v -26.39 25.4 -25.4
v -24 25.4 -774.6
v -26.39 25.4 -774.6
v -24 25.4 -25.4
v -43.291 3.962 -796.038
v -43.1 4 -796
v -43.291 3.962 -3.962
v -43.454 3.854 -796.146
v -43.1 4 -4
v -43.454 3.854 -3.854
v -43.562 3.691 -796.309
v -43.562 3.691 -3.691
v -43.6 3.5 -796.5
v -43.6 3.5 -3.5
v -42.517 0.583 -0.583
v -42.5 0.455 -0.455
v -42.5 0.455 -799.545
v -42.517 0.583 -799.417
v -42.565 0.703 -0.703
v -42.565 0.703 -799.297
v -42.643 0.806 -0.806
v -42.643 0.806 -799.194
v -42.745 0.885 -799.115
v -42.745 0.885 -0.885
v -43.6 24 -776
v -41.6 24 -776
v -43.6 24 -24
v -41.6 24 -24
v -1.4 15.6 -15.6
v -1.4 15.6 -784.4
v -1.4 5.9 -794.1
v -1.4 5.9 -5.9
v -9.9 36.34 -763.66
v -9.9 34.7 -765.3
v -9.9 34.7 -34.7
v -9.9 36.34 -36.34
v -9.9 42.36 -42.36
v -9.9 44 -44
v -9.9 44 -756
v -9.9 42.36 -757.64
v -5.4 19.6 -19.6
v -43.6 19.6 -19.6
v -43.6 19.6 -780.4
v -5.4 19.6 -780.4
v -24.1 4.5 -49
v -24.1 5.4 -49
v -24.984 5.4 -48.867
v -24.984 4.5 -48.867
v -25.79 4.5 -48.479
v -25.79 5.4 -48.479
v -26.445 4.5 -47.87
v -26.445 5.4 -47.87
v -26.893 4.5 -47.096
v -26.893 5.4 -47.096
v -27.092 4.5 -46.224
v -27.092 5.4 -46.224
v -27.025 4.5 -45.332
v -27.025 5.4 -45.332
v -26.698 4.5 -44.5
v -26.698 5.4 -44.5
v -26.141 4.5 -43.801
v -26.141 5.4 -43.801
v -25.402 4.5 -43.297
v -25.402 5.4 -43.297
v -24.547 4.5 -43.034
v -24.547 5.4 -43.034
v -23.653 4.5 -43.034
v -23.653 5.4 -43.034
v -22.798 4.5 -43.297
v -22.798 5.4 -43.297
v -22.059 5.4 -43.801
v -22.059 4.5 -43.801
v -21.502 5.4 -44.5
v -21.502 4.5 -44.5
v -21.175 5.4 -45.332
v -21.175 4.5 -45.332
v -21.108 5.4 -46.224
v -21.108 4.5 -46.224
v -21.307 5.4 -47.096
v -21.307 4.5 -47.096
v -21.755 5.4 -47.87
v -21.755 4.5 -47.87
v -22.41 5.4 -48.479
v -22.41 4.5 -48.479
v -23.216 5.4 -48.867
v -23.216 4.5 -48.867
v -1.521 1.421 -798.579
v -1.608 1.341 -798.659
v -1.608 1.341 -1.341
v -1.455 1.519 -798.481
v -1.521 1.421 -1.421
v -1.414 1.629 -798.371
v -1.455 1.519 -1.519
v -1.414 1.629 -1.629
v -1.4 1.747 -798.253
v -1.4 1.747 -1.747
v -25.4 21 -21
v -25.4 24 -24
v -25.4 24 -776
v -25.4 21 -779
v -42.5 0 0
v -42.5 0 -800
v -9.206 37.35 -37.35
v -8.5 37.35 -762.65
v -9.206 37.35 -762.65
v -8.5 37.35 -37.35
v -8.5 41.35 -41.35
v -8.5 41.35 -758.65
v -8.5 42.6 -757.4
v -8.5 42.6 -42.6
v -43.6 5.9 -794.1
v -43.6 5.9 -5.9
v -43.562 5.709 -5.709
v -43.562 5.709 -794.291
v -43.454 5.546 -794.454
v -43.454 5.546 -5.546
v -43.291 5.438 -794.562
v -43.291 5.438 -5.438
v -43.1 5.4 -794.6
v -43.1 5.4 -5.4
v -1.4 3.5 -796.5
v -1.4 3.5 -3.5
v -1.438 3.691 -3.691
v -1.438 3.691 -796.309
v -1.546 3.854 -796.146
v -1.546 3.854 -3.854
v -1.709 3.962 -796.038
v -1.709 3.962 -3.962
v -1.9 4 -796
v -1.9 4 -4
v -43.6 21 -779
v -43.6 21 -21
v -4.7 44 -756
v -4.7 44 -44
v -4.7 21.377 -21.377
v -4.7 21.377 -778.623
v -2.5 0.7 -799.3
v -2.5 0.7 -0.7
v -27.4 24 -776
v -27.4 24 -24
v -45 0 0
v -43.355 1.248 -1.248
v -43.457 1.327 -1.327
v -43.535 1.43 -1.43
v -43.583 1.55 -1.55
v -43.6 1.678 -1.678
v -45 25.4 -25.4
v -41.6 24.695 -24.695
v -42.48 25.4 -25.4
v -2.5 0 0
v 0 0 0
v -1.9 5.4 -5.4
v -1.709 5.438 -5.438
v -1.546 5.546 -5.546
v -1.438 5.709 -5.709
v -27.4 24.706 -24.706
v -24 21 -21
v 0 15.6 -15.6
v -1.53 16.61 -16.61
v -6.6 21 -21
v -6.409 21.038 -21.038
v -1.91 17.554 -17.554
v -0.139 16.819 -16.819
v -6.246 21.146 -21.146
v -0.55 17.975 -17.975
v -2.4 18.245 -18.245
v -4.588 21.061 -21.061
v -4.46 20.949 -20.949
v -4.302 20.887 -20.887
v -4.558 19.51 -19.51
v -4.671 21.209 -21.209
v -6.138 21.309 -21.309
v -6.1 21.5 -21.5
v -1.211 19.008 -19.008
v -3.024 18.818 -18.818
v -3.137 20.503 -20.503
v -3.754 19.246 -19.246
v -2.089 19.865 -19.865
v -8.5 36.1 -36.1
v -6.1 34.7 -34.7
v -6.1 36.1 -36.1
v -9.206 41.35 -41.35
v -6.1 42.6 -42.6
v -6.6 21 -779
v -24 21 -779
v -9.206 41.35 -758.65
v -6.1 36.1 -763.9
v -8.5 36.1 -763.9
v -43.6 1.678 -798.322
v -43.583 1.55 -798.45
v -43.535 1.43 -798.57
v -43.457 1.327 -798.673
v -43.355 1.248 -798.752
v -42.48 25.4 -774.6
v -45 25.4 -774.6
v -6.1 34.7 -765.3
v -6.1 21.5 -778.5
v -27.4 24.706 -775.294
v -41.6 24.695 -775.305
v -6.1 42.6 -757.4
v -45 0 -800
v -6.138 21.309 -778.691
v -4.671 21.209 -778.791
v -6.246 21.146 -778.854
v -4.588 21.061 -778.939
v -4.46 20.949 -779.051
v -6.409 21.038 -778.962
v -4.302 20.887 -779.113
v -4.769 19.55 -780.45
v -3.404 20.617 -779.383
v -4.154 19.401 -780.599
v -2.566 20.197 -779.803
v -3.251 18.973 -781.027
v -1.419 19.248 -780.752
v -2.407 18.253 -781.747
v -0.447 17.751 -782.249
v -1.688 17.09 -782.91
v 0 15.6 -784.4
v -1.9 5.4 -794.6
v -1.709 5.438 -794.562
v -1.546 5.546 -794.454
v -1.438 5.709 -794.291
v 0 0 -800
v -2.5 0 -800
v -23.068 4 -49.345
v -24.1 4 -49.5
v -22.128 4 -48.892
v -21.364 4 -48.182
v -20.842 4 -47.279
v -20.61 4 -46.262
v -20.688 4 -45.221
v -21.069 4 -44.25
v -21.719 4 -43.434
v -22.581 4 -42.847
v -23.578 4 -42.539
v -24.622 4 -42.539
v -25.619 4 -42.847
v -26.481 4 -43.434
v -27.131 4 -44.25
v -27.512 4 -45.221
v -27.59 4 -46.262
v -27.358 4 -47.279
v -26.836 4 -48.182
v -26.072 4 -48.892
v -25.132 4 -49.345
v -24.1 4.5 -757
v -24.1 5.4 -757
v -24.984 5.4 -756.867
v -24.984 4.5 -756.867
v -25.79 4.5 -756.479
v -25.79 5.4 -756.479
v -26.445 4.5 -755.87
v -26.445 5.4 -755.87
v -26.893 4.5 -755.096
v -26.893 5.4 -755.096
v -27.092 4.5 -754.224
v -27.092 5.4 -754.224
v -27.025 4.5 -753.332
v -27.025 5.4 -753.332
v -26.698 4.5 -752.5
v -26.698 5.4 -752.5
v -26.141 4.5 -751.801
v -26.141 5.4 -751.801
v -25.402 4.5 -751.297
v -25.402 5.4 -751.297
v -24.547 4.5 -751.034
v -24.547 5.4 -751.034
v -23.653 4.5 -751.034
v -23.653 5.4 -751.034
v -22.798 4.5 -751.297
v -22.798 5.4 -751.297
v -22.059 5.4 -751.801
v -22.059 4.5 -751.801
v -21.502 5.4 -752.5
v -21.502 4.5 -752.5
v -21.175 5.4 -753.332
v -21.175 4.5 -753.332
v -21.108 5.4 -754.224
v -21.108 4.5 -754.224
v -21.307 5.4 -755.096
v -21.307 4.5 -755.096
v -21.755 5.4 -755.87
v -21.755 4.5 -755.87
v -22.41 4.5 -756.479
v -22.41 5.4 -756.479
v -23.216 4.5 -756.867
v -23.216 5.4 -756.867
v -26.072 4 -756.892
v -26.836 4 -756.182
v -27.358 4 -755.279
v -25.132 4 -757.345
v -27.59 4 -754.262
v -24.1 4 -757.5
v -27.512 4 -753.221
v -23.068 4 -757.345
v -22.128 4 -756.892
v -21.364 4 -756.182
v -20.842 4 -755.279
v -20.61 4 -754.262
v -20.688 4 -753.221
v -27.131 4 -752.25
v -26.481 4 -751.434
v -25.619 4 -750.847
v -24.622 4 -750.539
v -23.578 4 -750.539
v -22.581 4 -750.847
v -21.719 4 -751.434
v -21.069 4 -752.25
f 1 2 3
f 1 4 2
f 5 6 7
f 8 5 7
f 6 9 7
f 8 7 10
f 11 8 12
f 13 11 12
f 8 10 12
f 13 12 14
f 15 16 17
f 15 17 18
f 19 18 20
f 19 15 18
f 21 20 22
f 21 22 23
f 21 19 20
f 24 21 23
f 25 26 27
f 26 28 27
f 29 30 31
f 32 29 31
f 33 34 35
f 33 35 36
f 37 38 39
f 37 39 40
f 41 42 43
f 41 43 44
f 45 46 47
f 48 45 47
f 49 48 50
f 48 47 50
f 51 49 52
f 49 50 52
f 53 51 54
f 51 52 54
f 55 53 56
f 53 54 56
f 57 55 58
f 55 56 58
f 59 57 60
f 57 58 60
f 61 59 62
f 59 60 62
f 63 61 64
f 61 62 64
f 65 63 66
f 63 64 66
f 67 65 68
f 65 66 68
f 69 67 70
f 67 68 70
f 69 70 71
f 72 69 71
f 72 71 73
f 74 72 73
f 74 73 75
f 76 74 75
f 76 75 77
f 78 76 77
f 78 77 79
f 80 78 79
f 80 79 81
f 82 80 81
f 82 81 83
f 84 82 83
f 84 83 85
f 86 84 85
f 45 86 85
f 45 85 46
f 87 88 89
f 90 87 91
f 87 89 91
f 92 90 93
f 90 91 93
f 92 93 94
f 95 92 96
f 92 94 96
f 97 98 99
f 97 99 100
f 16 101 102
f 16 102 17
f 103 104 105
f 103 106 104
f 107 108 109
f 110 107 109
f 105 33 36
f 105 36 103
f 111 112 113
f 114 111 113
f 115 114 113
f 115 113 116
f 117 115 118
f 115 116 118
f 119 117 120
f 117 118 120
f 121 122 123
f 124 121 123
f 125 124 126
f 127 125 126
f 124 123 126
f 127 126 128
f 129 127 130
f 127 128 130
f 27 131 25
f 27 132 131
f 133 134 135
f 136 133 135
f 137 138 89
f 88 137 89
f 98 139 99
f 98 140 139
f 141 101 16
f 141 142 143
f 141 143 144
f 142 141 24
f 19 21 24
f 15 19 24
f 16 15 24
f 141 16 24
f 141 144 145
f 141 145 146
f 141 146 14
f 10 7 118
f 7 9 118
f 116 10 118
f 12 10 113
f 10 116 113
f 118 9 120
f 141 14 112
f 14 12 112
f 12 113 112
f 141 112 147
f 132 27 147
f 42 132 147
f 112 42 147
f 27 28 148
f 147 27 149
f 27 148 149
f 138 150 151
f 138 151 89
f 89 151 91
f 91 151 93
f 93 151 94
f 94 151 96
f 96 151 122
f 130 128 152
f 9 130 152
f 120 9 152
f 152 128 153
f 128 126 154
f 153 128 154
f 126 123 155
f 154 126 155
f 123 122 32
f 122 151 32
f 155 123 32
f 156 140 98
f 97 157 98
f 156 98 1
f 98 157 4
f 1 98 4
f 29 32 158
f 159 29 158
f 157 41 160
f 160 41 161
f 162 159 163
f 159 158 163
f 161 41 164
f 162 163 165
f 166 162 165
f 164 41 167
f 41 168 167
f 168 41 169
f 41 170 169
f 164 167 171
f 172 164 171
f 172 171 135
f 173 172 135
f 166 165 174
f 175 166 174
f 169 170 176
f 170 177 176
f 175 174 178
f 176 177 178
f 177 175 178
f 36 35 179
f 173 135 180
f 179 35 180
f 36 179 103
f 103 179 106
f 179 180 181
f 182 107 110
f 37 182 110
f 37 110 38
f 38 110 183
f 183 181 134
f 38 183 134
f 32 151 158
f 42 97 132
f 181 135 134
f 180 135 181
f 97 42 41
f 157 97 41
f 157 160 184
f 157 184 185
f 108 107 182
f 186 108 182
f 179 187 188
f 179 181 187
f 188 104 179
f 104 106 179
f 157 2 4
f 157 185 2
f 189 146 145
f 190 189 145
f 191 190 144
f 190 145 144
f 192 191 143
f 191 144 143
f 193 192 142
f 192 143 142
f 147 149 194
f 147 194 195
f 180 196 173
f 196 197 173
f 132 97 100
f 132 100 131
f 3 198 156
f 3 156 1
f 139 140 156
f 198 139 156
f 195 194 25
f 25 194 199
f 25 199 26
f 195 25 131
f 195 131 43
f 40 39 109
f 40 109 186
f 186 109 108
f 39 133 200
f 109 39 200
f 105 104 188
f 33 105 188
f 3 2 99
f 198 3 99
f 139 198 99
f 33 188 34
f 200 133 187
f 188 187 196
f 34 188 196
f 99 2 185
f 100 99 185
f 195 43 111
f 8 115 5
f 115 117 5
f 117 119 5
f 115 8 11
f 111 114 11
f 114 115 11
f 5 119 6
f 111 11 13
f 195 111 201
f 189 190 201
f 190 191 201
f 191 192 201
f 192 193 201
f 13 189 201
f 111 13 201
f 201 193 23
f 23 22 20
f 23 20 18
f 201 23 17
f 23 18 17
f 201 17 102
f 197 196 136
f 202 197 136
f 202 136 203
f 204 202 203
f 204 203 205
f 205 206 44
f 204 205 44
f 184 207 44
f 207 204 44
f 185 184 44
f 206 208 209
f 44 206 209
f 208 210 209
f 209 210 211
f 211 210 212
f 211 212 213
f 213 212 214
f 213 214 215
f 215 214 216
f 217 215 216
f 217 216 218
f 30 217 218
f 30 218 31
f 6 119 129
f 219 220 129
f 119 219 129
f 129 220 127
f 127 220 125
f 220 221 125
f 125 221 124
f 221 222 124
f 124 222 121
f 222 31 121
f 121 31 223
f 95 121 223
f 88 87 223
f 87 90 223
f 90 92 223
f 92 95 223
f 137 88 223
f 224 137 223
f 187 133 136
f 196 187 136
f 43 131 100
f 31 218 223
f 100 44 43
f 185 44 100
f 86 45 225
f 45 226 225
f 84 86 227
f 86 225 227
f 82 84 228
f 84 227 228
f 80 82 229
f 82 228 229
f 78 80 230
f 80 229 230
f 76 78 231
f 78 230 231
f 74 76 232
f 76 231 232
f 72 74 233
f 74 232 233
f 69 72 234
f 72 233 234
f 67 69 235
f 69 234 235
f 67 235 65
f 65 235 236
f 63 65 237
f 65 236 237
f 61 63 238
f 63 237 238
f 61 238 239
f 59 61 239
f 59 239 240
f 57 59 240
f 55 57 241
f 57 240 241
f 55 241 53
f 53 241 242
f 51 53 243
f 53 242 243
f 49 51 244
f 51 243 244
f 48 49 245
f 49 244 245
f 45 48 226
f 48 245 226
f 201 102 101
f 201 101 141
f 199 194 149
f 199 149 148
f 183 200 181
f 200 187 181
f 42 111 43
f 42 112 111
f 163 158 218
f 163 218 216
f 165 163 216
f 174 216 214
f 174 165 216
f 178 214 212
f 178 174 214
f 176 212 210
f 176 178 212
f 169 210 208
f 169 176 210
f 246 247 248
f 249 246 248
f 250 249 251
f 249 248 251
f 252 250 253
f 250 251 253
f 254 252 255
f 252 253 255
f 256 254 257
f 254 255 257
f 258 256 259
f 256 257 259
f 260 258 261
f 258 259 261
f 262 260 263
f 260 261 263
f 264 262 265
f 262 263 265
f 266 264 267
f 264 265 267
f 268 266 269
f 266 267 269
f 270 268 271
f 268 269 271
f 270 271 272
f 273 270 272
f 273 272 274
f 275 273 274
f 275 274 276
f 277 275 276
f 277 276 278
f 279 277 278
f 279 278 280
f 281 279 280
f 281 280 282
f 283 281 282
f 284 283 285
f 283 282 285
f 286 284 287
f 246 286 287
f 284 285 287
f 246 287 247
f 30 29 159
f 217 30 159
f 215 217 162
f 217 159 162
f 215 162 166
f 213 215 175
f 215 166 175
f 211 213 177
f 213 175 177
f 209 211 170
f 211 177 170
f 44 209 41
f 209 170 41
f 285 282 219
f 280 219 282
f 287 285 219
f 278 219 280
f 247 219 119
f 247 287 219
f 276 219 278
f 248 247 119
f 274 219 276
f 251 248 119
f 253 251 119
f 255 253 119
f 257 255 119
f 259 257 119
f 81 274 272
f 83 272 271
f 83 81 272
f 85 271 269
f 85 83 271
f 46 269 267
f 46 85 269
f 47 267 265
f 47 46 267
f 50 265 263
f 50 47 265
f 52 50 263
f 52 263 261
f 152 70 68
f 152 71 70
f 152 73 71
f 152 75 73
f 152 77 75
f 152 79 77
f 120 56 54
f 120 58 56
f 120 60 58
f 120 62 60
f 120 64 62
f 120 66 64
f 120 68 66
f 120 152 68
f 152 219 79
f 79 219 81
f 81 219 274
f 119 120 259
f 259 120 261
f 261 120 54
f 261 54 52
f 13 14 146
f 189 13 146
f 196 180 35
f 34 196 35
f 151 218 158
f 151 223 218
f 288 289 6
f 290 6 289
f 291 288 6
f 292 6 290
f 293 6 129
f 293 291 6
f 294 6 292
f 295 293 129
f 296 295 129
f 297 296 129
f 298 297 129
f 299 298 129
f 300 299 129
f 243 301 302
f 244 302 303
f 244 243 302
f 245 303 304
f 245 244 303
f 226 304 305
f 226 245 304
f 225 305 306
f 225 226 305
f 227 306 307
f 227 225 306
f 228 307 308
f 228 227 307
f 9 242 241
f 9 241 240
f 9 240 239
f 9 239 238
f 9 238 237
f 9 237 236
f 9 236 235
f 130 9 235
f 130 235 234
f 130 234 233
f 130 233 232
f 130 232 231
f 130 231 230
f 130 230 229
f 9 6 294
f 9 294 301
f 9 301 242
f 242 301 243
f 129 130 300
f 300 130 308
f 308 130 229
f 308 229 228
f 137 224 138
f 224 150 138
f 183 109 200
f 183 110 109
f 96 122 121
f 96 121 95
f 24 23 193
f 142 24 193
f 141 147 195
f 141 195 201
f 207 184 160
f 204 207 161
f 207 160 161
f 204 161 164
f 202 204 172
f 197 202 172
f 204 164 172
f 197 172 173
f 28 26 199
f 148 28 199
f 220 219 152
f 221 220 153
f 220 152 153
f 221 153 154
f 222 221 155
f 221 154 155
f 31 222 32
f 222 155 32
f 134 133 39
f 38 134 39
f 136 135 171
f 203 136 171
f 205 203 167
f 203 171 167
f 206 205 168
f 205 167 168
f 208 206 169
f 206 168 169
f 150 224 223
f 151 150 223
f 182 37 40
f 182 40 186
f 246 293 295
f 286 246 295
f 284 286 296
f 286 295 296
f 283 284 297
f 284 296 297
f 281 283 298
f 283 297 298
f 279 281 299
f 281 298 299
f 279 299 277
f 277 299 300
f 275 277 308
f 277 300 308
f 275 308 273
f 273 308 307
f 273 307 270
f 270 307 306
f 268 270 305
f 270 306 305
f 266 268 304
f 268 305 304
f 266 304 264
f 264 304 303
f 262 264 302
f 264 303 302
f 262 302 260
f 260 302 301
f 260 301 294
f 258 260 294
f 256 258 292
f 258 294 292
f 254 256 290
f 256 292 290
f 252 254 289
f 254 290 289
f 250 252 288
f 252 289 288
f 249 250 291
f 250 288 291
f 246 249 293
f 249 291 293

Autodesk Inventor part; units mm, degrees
ref_plane "YZ Plane" through (0, 0, 0) normal (1, 0, 0) x (0, 1, 0)
ref_plane "XZ Plane" through (0, 0, 0) normal (0, 1, 0) x (-1, 0, 0)
sketch "Boceto1" plane through (0, 0, 0) normal (0, 0, 1) x (1, 0, 0)
  line L0 (-45, 21.0335) -> (-45, 0)
  line L1 (-43.1, 4) -> (-1.9, 4)
  line L2 (0, 0) -> (0, 15.6)
  line L3 (-4.7, 44) -> (-4.7, 21.3767)
  line L4 (-4.7, 44) -> (-9.9, 44)
  line L5 (-8.5, 42.6) -> (-6.1, 42.6)
  line L6 (-6.1, 36.1) -> (-8.5, 36.1)
  line L7 (-43.6, 19.6) -> (-5.4, 19.6)
  line L8 (-1.4, 15.6) -> (-1.4, 5.9)
  line L9 (-1.9, 5.4) -> (-43.1, 5.4)
  line L10 (-43.6, 5.9) -> (-43.6, 19.6)
  arc A0 (0, 15.6) -> (-4.3017, 20.8871) centre (-5.4, 15.6) ccw
  arc A1 (-1.4, 15.6) -> (-5.4, 19.6) centre (-5.4, 15.6) ccw
  line L11 (-1.4, 3.5) -> (-1.4, 1.7468)
  line L12 (-2.5, 0) -> (0, 0)
  line L13 (-6.1, 21.5) -> (-6.1, 34.7)
  line L14 (-6.1, 36.1) -> (-6.1, 42.6)
  line L15 (-43.6, 3.5) -> (-43.6, 1.6777)
  line L16 (-42.5, 0) -> (-45, 0)
  line L17 (-42.5, 0) -> (-42.5, 0.4554)
  line L18 (-2.5, 0) -> (-2.5, 0.7)
  line L19 (-43.6, 21) -> (-43.6, 24)
  line L20 (-42.48, 25.4) -> (-45, 25.4)
  line L21 (-45, 25.4) -> (-45, 21.0335)
  line L22 (-24, 21) -> (-24, 25.4)
  line L23 (-24, 25.4) -> (-26.39, 25.4)
  line L24 (-25.4, 24) -> (-25.4, 21)
  line L25 (-6.6, 21) -> (-24, 21)
  line L26 (-25.4, 21) -> (-43.6, 21)
  line L27 (-41.6, 24) -> (-43.6, 24)
  line L28 (-27.4, 24) -> (-25.4, 24)
  line L29 (-42.7447, 0.8853) -> (-43.3553, 1.2478)
  line L30 (-2.5, 0.7) -> (-1.6082, 1.3408)
  line L31 (-41.6, 24) -> (-41.6, 24.695)
  line L32 (-27.4, 24) -> (-27.4, 24.7058)
  line L33 (-42.48, 25.4) -> (-41.6, 24.695)
  line L34 (-27.4, 24.7058) -> (-26.39, 25.4)
  line L35 (-6.1, 34.7) -> (-9.9, 34.7)
  line L36 (-8.5, 37.35) -> (-8.5, 36.1)
  line L37 (-8.5, 41.35) -> (-8.5, 42.6)
  line L38 (-8.5, 37.35) -> (-9.2058, 37.35)
  line L39 (-8.5, 41.35) -> (-9.2058, 41.35)
  line L40 (-9.9, 44) -> (-9.9, 42.36)
  line L41 (-9.9, 42.36) -> (-9.2058, 41.35)
  line L42 (-9.9, 34.7) -> (-9.9, 36.34)
  line L43 (-9.9, 36.34) -> (-9.2058, 37.35)
  arc A2 (-6.6, 21) -> (-6.1, 21.5) centre (-6.6, 21.5) ccw
  arc A3 (-4.7, 21.3767) -> (-4.3017, 20.8871) centre (-4.2, 21.3767) ccw
  arc A4 (-1.9, 5.4) -> (-1.4, 5.9) centre (-1.9, 5.9) ccw
  arc A5 (-1.4, 3.5) -> (-1.9, 4) centre (-1.9, 3.5) ccw
  arc A6 (-1.6082, 1.3408) -> (-1.4, 1.7468) centre (-1.9, 1.7468) ccw
  arc A7 (-43.6, 5.9) -> (-43.1, 5.4) centre (-43.1, 5.9) ccw
  arc A8 (-43.1, 4) -> (-43.6, 3.5) centre (-43.1, 3.5) ccw
  arc A9 (-43.6, 1.6777) -> (-43.3553, 1.2478) centre (-43.1, 1.6777) ccw
  line L44 (0, 4) -> (0, 4.0335)
  arc A10 (-42.5, 0.4554) -> (-42.7447, 0.8853) centre (-43, 0.4554) ccw
  point P0 (-8.5, 41.975)
  point P1 (-42.5, 4)
  point P2 (-6.1, 39.35)
  point P3 (-42.5, 0.74)
  dimension "d16" = 5.4
  dimension "d17" = 4
  dimension "d32" = 1.4
  dimension "d35" = 1.4
  dimension "d37" = 3
  dimension "d38" = 25.4
  dimension "d44" = 18.2
  dimension "d50" = 0.7
  dimension "d53" = 40.3
  dimension "d54" = 37.5
  dimension "d55" = 1.4
  dimension "d57" = 17
  dimension "d62" = 30.7
  dimension "d63" = 35.7
  dimension "d64" = 4.4
  dimension "d66" = 3
  dimension "d69" = 4.4
  dimension "d71" = 3.4
  dimension "d72" = 3.4
  dimension "d73" = 0.88
  dimension "d74" = 1.01
  dimension "d75" = 34.5
  dimension "d76" = 38.7
  dimension "d77" = 0.695
  dimension "d78" = 0.7058
  dimension "d81" = 23
  dimension "d82" = 44
  dimension "d84" = 6.5
  dimension "d85" = 2.4
  dimension "d86" = 2.4
  dimension "d87" = 9.3
  dimension "d88" = 1.4
  dimension "d99" = 1.4
  dimension "d100" = 1.4
  dimension "d102" = 1.4
  dimension "d140" = 111
  dimension "d141" = 4
  dimension "d142" = 6.02
  dimension "d143" = 0.7058
  dimension "d144" = 0.7058
  dimension "d199" = 1.4
  dimension "d201" = 14.2
  dimension "d202" = 0.5
  dimension "d203" = 3.01
  dimension "d204" = 2
  dimension "d205" = 2.5
  dimension "d206" = 4.7
  dimension "d207" = 6.1
  dimension "d208" = 42.5
  dimension "d209" = 41.35
  dimension "d210" = 5.4
  dimension "d211" = 4
  dimension "d216" = 4.0335
  dimension "d218" = 0.74
  dimension "d219" = 0.5
  dimension "d220" = 45
  dimension "d221" = 5.2
  dimension "d225" = 1.4
extrude "Extrusión1" add sketch "Boceto1" against normal blind 800
sketch "Boceto2" plane through (0, 0, 0) normal (1, 0, 0) x (0, 1, 0)
  line L0 (0, 0) -> (15.6, 0) projected
  line L1 (0, 0) -> (0, -800) projected
  line L2 (15.6, -800) -> (0, -800) projected
  line L3 (15.6, 0) -> (15.6, -800) projected
  line L4 (15.6, 0) -> (20.8871, 0) projected
  line L5 (15.6, 0) -> (15.6, -800) projected
  line L6 (20.8871, -800) -> (15.6, -800) projected
  line L7 (20.8871, 0) -> (20.8871, -800) projected
  line L8 (21.3767, 0) -> (44, 0) projected
  line L9 (21.3767, 0) -> (21.3767, -800) projected
  line L10 (44, -800) -> (21.3767, -800) projected
  line L11 (44, 0) -> (44, -800) projected
  line L12 (20.8871, 0) -> (21.3767, 0) projected
  line L13 (20.8871, 0) -> (20.8871, -800) projected
  line L14 (21.3767, -800) -> (20.8871, -800) projected
  line L15 (21.3767, 0) -> (21.3767, -800) projected
  line L16 (0, 0) -> (44, -44)
  line L17 (44, 0) -> (44, -44)
  line L18 (0, 0) -> (44, 0)
  dimension "d224" = 45
extrude "Extrusión2" cut sketch "Boceto2" against normal through all contours L0 L3 L16 | L4 L7 L16 L3 | L12 L9 L16 L7 | L8 L11 L16 L9
ref_plane "Plano de trabajo1" through (0, 0, -400) normal (0, 0, 1) x (1, 0, 0)
mirror "Simetría1" about plane through (0, 0, -400) normal (0, 0, 1) of "Extrusión2"
sketch "Boceto3" plane through (-43.1, 4, -4) normal (0, -1, 0) x (1, 0, 0)
  circle A0 centre (19, -42) radius 3
  line L0 (40.6, 4) -> (40.6, -796) projected
  line L1 (0.6, 4) -> (0.6, -796) projected
  line L2 (-1.9, 4) -> (0.6, 4) projected
  line L3 (41.2, 0) -> (0, 0) projected
  point P0 (43.1, 4)
  dimension "d227" = 6
  dimension "d228" = 21.6
  dimension "d229" = 18.4
  dimension "d238" = 42
hole "Agujero1" at (-24.1, 4, -46) direction (0, 1, 0) diameter 6 depth 1.4 countersink diameter 7 countersink angle 90
pattern_linear "Patrón rectangular1" count 2 spacing 708 along (0, 0, -1) of "Agujero1"
thread "Rosca1" size "M6x1" class "6H" standard "ISO Metric profile" full length
thread "Rosca2" size "M6x1" class "6H" standard "ISO Metric profile" full length
properties part number "SP40-01 MARCO BATIENTE - PAÑO FIJO 800MM" material "Aluminio"
